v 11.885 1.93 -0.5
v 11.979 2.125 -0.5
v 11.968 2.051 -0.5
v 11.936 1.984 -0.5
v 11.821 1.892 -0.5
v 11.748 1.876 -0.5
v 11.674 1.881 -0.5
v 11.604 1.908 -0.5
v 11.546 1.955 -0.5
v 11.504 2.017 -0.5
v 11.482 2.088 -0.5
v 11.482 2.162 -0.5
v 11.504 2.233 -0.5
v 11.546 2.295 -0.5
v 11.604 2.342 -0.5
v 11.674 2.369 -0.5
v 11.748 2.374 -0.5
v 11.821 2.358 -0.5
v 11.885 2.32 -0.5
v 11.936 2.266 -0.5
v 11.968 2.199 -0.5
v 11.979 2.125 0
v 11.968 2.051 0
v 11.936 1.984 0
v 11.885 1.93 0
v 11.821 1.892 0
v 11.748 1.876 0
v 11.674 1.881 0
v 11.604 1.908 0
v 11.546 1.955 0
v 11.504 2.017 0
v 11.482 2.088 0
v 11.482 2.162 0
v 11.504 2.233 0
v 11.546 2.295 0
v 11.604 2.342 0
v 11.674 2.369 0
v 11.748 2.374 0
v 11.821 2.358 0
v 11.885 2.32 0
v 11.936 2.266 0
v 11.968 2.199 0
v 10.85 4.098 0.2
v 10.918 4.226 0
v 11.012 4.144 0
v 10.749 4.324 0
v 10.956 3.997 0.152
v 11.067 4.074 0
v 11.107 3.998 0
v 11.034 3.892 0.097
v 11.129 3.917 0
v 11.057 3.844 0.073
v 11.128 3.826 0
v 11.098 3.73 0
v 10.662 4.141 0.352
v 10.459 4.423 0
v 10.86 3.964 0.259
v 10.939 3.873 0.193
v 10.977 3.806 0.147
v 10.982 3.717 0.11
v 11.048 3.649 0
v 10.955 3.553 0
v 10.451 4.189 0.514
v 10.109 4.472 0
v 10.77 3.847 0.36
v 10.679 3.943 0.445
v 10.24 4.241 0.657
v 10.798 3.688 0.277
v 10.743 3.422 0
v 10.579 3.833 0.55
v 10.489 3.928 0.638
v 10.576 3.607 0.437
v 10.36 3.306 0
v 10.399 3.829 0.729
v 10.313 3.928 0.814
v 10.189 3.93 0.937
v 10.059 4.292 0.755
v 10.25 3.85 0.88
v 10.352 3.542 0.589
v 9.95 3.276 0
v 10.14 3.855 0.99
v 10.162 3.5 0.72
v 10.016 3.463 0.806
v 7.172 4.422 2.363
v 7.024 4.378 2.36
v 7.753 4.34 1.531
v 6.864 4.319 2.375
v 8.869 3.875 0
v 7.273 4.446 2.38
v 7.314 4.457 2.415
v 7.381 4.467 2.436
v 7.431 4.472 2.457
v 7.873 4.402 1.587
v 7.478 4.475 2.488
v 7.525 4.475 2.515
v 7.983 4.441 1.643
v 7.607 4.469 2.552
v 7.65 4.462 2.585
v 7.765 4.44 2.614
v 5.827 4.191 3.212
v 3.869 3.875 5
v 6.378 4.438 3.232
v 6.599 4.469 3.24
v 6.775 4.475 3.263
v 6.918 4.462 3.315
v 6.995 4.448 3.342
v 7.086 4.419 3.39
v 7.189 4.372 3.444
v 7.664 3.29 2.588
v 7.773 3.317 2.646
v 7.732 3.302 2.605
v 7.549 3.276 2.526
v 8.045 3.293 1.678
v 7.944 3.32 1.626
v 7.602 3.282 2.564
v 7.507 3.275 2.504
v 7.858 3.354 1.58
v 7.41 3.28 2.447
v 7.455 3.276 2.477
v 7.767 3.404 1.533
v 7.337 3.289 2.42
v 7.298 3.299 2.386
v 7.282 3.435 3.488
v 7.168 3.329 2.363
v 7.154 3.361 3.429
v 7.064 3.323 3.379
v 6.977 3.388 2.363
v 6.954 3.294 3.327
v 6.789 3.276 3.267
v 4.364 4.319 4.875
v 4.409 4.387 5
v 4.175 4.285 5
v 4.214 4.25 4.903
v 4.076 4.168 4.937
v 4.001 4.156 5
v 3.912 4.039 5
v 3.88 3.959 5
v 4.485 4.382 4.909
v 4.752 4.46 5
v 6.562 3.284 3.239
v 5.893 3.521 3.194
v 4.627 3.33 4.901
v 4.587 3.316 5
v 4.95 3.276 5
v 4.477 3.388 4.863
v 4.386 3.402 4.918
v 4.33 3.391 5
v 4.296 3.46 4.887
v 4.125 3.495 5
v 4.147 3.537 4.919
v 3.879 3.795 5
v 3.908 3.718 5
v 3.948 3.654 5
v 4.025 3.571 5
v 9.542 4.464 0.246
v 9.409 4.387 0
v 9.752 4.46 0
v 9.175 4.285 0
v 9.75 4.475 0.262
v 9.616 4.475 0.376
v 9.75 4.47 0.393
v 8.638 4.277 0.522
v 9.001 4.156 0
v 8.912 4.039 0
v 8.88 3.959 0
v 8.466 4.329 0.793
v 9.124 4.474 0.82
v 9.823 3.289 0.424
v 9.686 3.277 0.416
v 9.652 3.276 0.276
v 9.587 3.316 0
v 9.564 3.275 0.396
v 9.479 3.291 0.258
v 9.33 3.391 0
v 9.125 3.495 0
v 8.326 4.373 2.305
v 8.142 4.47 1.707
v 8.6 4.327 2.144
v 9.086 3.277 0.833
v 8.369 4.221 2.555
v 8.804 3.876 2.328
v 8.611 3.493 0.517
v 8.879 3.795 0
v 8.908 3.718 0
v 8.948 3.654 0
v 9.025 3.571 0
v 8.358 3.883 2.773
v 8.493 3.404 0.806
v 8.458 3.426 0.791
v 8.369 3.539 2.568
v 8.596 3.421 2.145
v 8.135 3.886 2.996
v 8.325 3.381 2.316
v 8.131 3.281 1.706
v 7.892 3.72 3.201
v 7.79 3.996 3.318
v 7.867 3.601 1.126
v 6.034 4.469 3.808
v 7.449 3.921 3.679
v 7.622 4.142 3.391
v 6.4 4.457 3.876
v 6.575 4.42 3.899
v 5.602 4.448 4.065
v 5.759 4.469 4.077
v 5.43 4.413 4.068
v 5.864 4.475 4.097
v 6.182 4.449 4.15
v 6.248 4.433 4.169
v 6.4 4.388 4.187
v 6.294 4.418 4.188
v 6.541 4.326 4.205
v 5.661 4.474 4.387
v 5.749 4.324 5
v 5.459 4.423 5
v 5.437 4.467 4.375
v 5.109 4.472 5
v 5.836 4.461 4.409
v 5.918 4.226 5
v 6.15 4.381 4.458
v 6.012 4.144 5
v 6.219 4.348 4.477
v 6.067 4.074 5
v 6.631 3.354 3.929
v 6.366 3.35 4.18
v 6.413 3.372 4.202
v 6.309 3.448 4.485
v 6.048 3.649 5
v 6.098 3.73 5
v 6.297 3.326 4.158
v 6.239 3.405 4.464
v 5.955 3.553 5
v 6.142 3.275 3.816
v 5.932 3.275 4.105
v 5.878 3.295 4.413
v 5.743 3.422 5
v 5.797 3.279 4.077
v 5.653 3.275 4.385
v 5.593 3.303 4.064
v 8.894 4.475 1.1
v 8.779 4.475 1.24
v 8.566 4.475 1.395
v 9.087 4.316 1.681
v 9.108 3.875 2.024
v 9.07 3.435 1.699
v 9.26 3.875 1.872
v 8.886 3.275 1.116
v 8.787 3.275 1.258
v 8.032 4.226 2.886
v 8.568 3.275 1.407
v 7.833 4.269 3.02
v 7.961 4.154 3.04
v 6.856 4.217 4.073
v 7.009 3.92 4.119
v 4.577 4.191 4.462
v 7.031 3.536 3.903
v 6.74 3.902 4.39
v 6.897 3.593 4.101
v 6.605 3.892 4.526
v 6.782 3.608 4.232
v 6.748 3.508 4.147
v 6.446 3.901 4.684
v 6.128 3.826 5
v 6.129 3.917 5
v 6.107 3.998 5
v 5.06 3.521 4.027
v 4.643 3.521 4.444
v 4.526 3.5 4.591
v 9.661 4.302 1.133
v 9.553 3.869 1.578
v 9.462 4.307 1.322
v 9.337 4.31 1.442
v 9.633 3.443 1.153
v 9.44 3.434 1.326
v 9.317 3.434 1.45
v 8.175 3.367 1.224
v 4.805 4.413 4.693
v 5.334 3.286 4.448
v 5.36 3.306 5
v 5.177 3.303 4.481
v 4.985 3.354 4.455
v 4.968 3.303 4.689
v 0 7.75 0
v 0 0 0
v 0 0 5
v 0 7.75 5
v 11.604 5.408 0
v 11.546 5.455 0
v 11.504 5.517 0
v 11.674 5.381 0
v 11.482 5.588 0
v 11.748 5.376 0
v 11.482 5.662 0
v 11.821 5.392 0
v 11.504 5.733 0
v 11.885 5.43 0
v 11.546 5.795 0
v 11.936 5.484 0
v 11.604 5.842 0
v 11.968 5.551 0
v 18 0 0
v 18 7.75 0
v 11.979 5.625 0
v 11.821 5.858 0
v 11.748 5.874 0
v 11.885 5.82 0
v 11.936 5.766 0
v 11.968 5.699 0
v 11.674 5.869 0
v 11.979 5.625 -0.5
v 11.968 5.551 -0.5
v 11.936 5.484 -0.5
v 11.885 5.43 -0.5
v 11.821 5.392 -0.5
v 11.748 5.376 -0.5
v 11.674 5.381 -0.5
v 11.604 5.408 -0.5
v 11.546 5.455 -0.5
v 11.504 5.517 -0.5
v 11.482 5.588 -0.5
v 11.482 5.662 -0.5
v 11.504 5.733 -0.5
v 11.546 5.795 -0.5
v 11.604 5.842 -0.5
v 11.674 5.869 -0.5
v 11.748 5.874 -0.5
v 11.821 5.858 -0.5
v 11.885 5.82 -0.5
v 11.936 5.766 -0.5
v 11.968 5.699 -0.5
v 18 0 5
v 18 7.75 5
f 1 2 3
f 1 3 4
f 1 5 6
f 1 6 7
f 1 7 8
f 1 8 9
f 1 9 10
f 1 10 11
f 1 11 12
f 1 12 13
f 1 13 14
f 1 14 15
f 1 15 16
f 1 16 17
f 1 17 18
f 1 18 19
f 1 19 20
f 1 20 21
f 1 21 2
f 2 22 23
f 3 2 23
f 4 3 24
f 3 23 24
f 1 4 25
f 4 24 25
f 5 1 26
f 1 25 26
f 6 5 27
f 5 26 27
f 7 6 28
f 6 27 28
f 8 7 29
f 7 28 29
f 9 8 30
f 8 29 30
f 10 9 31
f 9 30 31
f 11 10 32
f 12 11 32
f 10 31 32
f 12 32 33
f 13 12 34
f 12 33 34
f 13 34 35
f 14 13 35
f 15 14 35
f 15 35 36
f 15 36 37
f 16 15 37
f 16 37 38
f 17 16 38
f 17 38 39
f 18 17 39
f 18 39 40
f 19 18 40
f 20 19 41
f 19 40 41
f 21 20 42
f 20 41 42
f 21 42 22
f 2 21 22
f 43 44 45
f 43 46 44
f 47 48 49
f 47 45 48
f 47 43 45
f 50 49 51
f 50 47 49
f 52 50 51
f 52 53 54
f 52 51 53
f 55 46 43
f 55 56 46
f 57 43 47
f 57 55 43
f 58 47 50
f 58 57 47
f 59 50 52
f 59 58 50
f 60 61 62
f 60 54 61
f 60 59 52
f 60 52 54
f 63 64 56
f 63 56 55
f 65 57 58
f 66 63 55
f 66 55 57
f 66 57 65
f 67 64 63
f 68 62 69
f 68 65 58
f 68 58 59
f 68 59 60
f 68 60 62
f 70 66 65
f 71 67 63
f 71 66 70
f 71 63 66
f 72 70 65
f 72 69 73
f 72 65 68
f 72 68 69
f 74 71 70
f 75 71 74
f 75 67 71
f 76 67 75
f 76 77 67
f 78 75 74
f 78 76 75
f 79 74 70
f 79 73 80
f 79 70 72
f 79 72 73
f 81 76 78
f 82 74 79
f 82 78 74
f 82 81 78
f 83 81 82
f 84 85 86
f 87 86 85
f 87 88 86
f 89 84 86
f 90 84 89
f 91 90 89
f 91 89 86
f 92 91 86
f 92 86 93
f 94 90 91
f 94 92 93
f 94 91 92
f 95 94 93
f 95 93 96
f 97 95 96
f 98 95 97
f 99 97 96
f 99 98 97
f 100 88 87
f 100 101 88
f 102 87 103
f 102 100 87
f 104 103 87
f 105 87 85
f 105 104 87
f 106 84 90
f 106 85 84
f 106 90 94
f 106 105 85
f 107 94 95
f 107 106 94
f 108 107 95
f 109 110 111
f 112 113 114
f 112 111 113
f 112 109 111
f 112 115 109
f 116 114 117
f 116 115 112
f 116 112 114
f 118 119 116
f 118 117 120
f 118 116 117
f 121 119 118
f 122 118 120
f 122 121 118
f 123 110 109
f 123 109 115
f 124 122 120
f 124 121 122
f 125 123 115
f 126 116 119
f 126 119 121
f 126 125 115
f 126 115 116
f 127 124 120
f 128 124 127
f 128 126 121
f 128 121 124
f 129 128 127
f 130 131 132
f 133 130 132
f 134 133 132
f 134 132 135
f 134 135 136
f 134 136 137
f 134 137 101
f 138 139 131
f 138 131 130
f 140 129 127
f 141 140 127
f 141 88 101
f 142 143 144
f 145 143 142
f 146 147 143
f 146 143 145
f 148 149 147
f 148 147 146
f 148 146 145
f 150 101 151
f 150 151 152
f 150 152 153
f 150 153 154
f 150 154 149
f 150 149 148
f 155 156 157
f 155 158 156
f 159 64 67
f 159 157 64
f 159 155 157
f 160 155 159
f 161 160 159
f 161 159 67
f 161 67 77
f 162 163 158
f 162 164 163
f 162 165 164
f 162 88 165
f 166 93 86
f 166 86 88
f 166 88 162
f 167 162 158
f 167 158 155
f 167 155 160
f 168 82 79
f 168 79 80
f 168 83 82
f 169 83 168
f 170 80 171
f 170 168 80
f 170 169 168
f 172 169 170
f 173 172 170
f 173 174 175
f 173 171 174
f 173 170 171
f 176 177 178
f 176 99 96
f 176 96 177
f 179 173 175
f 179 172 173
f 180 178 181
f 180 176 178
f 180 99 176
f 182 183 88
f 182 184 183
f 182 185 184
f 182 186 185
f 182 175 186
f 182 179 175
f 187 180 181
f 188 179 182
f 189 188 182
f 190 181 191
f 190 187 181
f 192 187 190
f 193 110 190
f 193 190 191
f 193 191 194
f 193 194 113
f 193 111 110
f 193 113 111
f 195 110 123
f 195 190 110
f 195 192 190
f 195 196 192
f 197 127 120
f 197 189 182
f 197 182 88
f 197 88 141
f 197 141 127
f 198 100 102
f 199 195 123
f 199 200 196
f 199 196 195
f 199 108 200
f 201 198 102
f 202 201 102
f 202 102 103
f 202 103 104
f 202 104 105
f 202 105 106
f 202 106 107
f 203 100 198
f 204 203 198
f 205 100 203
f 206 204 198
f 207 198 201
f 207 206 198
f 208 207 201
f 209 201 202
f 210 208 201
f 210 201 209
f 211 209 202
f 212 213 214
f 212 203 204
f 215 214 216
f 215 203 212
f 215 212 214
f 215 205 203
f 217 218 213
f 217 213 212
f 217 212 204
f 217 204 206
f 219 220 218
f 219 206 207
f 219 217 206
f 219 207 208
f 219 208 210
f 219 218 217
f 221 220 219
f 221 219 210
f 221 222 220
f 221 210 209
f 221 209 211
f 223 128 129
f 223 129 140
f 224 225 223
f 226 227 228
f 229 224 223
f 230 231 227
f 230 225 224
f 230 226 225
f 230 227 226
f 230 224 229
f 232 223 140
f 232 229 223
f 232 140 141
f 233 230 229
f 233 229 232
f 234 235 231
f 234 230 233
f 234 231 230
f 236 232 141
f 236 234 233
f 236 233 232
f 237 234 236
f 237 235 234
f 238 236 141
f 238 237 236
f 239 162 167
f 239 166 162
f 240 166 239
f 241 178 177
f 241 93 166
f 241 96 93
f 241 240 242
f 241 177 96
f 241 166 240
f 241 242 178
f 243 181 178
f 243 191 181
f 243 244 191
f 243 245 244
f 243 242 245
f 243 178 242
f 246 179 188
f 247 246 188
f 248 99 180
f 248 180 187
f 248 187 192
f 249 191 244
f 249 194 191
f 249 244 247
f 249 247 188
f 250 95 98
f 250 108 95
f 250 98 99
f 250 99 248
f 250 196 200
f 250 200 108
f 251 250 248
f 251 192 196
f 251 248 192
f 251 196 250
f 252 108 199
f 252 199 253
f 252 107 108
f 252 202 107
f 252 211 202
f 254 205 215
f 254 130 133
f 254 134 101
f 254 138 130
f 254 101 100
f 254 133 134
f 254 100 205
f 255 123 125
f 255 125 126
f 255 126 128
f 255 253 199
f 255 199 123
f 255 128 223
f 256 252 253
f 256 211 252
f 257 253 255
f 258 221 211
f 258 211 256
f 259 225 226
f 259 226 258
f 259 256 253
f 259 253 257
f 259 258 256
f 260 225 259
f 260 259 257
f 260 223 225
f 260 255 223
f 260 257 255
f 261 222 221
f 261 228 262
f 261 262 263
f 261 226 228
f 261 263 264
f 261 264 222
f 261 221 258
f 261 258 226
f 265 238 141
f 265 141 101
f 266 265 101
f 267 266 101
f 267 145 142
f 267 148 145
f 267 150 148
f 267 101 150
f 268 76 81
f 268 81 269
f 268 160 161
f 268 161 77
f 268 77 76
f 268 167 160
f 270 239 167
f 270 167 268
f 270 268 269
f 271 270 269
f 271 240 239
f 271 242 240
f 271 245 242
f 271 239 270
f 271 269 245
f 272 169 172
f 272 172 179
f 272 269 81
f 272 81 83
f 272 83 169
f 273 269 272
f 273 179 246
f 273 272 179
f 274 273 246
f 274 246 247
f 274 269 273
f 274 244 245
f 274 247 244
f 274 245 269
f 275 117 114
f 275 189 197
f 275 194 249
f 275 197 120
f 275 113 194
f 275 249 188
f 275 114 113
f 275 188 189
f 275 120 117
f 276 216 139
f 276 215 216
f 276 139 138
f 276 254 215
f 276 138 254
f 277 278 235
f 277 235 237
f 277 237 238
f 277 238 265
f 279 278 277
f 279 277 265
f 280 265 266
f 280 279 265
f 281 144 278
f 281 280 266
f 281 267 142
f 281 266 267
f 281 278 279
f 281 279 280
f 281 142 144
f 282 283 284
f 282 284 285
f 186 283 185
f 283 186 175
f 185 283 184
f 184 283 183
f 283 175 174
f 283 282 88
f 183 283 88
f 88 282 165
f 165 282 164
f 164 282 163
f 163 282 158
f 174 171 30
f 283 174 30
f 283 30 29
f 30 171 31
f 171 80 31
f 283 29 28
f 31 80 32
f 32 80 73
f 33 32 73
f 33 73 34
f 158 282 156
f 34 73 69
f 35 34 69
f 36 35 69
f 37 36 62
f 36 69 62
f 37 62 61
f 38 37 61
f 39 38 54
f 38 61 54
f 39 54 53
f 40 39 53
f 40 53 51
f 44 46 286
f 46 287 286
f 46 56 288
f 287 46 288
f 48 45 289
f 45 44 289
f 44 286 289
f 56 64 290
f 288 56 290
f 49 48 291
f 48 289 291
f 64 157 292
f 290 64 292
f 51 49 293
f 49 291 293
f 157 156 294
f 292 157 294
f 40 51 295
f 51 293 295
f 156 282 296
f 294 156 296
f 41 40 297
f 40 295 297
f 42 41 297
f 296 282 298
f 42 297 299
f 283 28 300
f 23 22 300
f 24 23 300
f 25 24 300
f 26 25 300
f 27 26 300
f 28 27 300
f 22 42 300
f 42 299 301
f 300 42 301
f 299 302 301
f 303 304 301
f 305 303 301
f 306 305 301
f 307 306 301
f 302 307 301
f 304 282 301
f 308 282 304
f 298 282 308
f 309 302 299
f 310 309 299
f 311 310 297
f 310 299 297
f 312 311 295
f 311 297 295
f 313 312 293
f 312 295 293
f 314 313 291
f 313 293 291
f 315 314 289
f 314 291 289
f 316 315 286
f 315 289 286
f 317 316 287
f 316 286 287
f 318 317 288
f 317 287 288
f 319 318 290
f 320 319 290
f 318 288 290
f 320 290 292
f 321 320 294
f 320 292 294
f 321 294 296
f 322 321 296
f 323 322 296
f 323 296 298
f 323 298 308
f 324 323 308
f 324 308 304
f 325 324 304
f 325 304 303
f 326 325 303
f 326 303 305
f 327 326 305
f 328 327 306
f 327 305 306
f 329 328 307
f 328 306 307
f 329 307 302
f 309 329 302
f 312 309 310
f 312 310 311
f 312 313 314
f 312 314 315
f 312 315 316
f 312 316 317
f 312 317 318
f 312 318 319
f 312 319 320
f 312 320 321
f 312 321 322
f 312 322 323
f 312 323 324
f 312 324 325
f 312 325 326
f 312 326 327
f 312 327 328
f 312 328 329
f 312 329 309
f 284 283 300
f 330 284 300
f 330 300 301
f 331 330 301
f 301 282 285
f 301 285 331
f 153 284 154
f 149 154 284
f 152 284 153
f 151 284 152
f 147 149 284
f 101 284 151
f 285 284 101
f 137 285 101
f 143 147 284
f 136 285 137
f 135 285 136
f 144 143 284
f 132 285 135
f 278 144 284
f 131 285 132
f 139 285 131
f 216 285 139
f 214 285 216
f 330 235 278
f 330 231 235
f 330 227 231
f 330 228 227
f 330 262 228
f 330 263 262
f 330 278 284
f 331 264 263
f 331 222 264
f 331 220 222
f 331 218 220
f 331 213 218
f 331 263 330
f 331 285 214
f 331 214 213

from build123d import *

# Parameters (mm, degrees)
ESQUISSE1_W                  = 18
ESQUISSE1_H                  = 7.75
BOSS_EXTRU_1_DEPTH           = 5
ENL_V_MAT_EXTRU_1_DEPTH      = 15
ENL_V_MAT_EXTRU_1_DEPTH_BACK = 10
ESQUISSE13_RX                = 0.8
ESQUISSE13_RY                = 0.6
ESQUISSE15_R                 = 0.25
BOSS_EXTRU_3_DEPTH           = 0.5


with BuildPart() as part:
    # Esquisse1 → Boss.-Extru.1 (new body)
    with BuildSketch(Plane.XY):
        with Locations((9, 3.875)):
            Rectangle(ESQUISSE1_W, ESQUISSE1_H)
    extrude(amount=BOSS_EXTRU_1_DEPTH)

    # Esquisse13 → Enlèv. mat.-Extru.1 (cut, two sides: drawn at the far end of the back side and taken through both)
    with BuildSketch(Plane(origin=(5, 3.875, 5), x_dir=(-0.7071067811865476, 0, -0.7071067811865475), z_dir=(0.7071067811865475, 0, -0.7071067811865476)).offset(-ENL_V_MAT_EXTRU_1_DEPTH_BACK)):
        with Locations(Location((0, 0), (0, 0, 0))):
            Ellipse(ESQUISSE13_RX, ESQUISSE13_RY)
    extrude(amount=ENL_V_MAT_EXTRU_1_DEPTH + ENL_V_MAT_EXTRU_1_DEPTH_BACK, mode=Mode.SUBTRACT)

    # Esquisse15 → Boss.-Extru.3 (add)
    with BuildSketch(Plane(origin=(0, 0, 0), x_dir=(-1, 0, 0), z_dir=(0, 0, -1))):
        with Locations((-11.729236125, 2.125)):
            Circle(ESQUISSE15_R)
        with Locations((-11.729236125, 5.625)):
            Circle(ESQUISSE15_R)
    extrude(amount=BOSS_EXTRU_3_DEPTH)


solid = part.part
